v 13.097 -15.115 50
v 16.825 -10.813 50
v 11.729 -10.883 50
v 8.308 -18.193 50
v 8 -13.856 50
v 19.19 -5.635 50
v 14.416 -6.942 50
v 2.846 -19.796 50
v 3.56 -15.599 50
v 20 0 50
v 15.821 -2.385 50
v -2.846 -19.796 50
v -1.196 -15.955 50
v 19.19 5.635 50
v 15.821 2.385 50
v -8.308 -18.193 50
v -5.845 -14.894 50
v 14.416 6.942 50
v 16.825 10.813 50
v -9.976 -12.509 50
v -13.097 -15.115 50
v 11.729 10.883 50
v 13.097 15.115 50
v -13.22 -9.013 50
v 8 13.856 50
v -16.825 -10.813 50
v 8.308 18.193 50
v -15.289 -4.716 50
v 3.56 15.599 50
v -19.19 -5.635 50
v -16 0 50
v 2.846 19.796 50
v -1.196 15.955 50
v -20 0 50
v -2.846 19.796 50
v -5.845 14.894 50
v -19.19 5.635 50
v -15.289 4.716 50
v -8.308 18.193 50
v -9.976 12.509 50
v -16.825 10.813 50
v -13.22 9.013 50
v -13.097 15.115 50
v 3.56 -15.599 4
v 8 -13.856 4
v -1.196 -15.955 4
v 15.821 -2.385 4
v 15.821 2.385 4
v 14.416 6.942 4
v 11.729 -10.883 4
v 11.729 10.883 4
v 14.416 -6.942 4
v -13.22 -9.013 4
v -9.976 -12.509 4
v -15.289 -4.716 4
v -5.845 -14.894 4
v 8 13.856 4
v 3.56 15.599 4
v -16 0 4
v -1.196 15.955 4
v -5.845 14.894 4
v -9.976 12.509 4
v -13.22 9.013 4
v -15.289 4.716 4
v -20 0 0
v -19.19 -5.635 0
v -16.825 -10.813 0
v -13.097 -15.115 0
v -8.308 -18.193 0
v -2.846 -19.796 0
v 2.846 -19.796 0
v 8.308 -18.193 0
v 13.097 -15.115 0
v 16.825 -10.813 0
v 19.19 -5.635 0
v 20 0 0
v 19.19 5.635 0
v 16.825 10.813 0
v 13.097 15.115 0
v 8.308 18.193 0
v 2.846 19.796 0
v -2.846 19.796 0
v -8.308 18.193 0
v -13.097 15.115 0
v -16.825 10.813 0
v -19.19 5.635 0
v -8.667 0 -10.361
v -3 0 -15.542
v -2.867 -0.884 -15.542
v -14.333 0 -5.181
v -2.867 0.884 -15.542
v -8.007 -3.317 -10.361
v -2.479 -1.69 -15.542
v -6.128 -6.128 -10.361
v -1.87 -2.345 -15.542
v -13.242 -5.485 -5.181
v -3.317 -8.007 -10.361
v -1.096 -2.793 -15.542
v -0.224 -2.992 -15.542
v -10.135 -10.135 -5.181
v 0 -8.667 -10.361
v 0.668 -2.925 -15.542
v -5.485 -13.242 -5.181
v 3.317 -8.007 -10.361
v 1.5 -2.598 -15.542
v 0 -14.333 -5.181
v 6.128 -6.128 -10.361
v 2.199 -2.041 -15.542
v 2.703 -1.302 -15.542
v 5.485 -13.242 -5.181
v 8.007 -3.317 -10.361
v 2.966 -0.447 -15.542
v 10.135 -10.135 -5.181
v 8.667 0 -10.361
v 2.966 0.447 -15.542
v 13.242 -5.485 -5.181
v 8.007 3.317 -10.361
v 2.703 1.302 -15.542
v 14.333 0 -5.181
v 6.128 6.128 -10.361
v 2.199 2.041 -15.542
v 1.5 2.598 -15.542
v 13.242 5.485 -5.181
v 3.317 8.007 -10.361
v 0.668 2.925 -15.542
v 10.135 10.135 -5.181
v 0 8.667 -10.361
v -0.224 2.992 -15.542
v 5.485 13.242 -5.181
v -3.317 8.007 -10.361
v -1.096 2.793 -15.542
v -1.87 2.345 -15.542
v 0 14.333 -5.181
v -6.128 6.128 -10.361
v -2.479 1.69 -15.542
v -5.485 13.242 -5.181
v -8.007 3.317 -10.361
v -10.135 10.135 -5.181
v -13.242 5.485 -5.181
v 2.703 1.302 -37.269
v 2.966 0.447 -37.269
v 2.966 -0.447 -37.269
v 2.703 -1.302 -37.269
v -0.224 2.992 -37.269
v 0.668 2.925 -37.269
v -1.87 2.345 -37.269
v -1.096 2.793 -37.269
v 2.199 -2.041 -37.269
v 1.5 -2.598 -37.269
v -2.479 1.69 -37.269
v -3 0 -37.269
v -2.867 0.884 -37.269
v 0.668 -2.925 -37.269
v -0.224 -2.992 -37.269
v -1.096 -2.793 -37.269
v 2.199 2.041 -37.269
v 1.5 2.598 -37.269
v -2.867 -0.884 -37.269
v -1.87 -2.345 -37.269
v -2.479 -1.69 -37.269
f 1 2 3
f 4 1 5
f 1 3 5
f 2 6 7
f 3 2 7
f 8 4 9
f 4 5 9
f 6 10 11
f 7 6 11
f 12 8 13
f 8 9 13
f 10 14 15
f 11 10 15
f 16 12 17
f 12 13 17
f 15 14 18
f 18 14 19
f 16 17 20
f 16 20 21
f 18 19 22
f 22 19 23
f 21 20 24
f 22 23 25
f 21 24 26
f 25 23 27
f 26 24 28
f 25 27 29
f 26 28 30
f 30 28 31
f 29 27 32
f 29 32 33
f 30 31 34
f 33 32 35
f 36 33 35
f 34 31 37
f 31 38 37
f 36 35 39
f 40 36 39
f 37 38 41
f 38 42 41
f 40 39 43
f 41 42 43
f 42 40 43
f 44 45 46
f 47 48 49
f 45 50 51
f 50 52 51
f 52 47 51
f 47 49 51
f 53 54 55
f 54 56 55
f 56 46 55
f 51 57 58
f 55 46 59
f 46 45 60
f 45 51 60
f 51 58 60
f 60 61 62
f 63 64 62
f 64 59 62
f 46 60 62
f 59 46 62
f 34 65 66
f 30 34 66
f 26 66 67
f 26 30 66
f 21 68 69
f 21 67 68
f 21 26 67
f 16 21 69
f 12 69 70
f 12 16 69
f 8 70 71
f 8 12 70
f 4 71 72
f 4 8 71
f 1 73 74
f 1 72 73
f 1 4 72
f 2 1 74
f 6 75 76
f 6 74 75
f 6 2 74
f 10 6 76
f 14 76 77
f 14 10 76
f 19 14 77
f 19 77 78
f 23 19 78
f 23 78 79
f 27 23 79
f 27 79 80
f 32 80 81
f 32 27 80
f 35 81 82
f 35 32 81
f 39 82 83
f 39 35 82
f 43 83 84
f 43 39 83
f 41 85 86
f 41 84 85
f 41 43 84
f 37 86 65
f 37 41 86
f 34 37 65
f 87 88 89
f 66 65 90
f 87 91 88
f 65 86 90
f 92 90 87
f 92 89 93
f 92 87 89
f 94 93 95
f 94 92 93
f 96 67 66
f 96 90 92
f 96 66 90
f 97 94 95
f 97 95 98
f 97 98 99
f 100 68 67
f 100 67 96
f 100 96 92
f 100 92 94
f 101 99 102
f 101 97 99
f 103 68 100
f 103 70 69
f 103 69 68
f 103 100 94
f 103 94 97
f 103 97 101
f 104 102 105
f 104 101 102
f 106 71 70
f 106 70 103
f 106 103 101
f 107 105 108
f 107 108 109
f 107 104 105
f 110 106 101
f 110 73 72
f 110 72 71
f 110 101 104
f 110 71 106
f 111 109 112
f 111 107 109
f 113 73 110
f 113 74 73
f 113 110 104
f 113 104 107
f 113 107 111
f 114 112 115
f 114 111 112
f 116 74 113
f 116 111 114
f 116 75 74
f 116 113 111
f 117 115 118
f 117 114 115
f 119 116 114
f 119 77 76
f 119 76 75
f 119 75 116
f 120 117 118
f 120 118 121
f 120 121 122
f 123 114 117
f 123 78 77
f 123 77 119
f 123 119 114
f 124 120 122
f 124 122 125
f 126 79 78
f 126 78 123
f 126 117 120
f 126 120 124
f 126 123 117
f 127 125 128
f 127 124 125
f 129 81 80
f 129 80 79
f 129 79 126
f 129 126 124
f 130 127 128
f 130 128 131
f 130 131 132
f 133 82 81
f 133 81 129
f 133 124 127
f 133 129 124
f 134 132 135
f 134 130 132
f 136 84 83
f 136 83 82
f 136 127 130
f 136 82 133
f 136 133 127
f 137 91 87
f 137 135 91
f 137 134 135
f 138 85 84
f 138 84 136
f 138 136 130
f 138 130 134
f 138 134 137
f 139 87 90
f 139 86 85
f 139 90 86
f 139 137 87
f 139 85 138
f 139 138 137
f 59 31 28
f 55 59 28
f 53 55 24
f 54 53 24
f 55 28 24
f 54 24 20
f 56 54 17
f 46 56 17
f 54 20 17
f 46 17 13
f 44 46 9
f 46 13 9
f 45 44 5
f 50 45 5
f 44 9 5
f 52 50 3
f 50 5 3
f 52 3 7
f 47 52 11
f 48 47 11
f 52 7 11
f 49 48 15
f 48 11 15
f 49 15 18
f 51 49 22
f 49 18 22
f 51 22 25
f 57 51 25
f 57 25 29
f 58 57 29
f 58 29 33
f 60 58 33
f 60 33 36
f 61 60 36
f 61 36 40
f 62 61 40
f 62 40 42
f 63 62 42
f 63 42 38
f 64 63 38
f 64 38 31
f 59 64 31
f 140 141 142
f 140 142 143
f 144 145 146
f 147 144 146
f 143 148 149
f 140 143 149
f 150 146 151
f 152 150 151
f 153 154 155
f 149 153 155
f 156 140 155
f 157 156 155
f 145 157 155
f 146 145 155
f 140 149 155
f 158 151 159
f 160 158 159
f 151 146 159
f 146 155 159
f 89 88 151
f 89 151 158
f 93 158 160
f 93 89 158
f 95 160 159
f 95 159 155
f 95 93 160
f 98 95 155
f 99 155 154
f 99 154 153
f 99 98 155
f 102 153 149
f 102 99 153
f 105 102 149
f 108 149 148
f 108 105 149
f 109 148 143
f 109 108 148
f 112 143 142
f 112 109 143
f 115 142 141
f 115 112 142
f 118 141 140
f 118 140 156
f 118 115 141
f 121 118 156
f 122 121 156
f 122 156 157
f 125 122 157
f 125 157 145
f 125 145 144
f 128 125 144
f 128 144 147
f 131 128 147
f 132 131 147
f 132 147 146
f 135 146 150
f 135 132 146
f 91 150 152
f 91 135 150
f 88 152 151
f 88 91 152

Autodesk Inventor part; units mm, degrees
ref_plane "YZ Plane" through (0, 0, 0) normal (1, 0, 0) x (0, 1, 0)
ref_plane "XZ Plane" through (0, 0, 0) normal (0, 1, 0) x (-1, 0, 0)
ref_plane "XY Plane" through (0, 0, 0) normal (0, 0, 1) x (1, 0, 0)
sketch "スケッチ1" plane through (0, 0, 0) normal (0, 1, 0) x (-1, 0, 0)
  line L0 (0, 0) -> (20, 0) construction
  line L1 (20, 0) -> (20, 50)
  line L2 (20, 50) -> (0, 50)
  line L3 (20, 0) -> (0, 0)
  line L4 (0, 50) -> (0, 0)
  dimension "d4" = 50
  dimension "d12" = 20
revolve "回転1" add sketch "スケッチ1" angle 360 about axis through (0, 0, 50) along (0, 0, -1)
shell "シェル1" thickness 4 removed faces 1 at (-2.364, 6.2334, 50)
sketch "スケッチ2" plane through (0, 0, 0) normal (0, 1, 0) x (-1, 0, 0)
  line L0 (-20, 0) -> (20, 0) projected
  line L1 (0, -17.2687) -> (0, 0)
  line L2 (0, 0) -> (20, 0)
  line L3 (0, -17.2687) -> (0, -37.2687)
  line L4 (0, -37.2687) -> (3, -37.2687)
  line L5 (3, -37.2687) -> (3, -15.5418)
  line L6 (20, 0) -> (3, -15.5418)
  dimension "d9" = 20
  dimension "d10" = 3
revolve "回転2" add sketch "スケッチ2" angle 360 about axis through (0, 0, -17.2687) along (0, 0, 1)
properties part number "promo1"
